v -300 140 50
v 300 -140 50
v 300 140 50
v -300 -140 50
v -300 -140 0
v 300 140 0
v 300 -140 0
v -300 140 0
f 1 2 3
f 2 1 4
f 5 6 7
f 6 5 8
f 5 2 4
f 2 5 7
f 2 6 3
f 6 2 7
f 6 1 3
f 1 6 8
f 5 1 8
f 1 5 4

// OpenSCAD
// Generated documentary F1 envelope proxy.
// Not manufacturing geometry, not dimensionally validated, not SimReady.
proxy_id = "993-INTERCOOLER-AIR-DUCT";
$fn = 96;

length_mm = 600;
width_mm = 280;
height_mm = 50;

translate([-length_mm / 2, -width_mm / 2, 0])
    cube([length_mm, width_mm, height_mm], center = false);
